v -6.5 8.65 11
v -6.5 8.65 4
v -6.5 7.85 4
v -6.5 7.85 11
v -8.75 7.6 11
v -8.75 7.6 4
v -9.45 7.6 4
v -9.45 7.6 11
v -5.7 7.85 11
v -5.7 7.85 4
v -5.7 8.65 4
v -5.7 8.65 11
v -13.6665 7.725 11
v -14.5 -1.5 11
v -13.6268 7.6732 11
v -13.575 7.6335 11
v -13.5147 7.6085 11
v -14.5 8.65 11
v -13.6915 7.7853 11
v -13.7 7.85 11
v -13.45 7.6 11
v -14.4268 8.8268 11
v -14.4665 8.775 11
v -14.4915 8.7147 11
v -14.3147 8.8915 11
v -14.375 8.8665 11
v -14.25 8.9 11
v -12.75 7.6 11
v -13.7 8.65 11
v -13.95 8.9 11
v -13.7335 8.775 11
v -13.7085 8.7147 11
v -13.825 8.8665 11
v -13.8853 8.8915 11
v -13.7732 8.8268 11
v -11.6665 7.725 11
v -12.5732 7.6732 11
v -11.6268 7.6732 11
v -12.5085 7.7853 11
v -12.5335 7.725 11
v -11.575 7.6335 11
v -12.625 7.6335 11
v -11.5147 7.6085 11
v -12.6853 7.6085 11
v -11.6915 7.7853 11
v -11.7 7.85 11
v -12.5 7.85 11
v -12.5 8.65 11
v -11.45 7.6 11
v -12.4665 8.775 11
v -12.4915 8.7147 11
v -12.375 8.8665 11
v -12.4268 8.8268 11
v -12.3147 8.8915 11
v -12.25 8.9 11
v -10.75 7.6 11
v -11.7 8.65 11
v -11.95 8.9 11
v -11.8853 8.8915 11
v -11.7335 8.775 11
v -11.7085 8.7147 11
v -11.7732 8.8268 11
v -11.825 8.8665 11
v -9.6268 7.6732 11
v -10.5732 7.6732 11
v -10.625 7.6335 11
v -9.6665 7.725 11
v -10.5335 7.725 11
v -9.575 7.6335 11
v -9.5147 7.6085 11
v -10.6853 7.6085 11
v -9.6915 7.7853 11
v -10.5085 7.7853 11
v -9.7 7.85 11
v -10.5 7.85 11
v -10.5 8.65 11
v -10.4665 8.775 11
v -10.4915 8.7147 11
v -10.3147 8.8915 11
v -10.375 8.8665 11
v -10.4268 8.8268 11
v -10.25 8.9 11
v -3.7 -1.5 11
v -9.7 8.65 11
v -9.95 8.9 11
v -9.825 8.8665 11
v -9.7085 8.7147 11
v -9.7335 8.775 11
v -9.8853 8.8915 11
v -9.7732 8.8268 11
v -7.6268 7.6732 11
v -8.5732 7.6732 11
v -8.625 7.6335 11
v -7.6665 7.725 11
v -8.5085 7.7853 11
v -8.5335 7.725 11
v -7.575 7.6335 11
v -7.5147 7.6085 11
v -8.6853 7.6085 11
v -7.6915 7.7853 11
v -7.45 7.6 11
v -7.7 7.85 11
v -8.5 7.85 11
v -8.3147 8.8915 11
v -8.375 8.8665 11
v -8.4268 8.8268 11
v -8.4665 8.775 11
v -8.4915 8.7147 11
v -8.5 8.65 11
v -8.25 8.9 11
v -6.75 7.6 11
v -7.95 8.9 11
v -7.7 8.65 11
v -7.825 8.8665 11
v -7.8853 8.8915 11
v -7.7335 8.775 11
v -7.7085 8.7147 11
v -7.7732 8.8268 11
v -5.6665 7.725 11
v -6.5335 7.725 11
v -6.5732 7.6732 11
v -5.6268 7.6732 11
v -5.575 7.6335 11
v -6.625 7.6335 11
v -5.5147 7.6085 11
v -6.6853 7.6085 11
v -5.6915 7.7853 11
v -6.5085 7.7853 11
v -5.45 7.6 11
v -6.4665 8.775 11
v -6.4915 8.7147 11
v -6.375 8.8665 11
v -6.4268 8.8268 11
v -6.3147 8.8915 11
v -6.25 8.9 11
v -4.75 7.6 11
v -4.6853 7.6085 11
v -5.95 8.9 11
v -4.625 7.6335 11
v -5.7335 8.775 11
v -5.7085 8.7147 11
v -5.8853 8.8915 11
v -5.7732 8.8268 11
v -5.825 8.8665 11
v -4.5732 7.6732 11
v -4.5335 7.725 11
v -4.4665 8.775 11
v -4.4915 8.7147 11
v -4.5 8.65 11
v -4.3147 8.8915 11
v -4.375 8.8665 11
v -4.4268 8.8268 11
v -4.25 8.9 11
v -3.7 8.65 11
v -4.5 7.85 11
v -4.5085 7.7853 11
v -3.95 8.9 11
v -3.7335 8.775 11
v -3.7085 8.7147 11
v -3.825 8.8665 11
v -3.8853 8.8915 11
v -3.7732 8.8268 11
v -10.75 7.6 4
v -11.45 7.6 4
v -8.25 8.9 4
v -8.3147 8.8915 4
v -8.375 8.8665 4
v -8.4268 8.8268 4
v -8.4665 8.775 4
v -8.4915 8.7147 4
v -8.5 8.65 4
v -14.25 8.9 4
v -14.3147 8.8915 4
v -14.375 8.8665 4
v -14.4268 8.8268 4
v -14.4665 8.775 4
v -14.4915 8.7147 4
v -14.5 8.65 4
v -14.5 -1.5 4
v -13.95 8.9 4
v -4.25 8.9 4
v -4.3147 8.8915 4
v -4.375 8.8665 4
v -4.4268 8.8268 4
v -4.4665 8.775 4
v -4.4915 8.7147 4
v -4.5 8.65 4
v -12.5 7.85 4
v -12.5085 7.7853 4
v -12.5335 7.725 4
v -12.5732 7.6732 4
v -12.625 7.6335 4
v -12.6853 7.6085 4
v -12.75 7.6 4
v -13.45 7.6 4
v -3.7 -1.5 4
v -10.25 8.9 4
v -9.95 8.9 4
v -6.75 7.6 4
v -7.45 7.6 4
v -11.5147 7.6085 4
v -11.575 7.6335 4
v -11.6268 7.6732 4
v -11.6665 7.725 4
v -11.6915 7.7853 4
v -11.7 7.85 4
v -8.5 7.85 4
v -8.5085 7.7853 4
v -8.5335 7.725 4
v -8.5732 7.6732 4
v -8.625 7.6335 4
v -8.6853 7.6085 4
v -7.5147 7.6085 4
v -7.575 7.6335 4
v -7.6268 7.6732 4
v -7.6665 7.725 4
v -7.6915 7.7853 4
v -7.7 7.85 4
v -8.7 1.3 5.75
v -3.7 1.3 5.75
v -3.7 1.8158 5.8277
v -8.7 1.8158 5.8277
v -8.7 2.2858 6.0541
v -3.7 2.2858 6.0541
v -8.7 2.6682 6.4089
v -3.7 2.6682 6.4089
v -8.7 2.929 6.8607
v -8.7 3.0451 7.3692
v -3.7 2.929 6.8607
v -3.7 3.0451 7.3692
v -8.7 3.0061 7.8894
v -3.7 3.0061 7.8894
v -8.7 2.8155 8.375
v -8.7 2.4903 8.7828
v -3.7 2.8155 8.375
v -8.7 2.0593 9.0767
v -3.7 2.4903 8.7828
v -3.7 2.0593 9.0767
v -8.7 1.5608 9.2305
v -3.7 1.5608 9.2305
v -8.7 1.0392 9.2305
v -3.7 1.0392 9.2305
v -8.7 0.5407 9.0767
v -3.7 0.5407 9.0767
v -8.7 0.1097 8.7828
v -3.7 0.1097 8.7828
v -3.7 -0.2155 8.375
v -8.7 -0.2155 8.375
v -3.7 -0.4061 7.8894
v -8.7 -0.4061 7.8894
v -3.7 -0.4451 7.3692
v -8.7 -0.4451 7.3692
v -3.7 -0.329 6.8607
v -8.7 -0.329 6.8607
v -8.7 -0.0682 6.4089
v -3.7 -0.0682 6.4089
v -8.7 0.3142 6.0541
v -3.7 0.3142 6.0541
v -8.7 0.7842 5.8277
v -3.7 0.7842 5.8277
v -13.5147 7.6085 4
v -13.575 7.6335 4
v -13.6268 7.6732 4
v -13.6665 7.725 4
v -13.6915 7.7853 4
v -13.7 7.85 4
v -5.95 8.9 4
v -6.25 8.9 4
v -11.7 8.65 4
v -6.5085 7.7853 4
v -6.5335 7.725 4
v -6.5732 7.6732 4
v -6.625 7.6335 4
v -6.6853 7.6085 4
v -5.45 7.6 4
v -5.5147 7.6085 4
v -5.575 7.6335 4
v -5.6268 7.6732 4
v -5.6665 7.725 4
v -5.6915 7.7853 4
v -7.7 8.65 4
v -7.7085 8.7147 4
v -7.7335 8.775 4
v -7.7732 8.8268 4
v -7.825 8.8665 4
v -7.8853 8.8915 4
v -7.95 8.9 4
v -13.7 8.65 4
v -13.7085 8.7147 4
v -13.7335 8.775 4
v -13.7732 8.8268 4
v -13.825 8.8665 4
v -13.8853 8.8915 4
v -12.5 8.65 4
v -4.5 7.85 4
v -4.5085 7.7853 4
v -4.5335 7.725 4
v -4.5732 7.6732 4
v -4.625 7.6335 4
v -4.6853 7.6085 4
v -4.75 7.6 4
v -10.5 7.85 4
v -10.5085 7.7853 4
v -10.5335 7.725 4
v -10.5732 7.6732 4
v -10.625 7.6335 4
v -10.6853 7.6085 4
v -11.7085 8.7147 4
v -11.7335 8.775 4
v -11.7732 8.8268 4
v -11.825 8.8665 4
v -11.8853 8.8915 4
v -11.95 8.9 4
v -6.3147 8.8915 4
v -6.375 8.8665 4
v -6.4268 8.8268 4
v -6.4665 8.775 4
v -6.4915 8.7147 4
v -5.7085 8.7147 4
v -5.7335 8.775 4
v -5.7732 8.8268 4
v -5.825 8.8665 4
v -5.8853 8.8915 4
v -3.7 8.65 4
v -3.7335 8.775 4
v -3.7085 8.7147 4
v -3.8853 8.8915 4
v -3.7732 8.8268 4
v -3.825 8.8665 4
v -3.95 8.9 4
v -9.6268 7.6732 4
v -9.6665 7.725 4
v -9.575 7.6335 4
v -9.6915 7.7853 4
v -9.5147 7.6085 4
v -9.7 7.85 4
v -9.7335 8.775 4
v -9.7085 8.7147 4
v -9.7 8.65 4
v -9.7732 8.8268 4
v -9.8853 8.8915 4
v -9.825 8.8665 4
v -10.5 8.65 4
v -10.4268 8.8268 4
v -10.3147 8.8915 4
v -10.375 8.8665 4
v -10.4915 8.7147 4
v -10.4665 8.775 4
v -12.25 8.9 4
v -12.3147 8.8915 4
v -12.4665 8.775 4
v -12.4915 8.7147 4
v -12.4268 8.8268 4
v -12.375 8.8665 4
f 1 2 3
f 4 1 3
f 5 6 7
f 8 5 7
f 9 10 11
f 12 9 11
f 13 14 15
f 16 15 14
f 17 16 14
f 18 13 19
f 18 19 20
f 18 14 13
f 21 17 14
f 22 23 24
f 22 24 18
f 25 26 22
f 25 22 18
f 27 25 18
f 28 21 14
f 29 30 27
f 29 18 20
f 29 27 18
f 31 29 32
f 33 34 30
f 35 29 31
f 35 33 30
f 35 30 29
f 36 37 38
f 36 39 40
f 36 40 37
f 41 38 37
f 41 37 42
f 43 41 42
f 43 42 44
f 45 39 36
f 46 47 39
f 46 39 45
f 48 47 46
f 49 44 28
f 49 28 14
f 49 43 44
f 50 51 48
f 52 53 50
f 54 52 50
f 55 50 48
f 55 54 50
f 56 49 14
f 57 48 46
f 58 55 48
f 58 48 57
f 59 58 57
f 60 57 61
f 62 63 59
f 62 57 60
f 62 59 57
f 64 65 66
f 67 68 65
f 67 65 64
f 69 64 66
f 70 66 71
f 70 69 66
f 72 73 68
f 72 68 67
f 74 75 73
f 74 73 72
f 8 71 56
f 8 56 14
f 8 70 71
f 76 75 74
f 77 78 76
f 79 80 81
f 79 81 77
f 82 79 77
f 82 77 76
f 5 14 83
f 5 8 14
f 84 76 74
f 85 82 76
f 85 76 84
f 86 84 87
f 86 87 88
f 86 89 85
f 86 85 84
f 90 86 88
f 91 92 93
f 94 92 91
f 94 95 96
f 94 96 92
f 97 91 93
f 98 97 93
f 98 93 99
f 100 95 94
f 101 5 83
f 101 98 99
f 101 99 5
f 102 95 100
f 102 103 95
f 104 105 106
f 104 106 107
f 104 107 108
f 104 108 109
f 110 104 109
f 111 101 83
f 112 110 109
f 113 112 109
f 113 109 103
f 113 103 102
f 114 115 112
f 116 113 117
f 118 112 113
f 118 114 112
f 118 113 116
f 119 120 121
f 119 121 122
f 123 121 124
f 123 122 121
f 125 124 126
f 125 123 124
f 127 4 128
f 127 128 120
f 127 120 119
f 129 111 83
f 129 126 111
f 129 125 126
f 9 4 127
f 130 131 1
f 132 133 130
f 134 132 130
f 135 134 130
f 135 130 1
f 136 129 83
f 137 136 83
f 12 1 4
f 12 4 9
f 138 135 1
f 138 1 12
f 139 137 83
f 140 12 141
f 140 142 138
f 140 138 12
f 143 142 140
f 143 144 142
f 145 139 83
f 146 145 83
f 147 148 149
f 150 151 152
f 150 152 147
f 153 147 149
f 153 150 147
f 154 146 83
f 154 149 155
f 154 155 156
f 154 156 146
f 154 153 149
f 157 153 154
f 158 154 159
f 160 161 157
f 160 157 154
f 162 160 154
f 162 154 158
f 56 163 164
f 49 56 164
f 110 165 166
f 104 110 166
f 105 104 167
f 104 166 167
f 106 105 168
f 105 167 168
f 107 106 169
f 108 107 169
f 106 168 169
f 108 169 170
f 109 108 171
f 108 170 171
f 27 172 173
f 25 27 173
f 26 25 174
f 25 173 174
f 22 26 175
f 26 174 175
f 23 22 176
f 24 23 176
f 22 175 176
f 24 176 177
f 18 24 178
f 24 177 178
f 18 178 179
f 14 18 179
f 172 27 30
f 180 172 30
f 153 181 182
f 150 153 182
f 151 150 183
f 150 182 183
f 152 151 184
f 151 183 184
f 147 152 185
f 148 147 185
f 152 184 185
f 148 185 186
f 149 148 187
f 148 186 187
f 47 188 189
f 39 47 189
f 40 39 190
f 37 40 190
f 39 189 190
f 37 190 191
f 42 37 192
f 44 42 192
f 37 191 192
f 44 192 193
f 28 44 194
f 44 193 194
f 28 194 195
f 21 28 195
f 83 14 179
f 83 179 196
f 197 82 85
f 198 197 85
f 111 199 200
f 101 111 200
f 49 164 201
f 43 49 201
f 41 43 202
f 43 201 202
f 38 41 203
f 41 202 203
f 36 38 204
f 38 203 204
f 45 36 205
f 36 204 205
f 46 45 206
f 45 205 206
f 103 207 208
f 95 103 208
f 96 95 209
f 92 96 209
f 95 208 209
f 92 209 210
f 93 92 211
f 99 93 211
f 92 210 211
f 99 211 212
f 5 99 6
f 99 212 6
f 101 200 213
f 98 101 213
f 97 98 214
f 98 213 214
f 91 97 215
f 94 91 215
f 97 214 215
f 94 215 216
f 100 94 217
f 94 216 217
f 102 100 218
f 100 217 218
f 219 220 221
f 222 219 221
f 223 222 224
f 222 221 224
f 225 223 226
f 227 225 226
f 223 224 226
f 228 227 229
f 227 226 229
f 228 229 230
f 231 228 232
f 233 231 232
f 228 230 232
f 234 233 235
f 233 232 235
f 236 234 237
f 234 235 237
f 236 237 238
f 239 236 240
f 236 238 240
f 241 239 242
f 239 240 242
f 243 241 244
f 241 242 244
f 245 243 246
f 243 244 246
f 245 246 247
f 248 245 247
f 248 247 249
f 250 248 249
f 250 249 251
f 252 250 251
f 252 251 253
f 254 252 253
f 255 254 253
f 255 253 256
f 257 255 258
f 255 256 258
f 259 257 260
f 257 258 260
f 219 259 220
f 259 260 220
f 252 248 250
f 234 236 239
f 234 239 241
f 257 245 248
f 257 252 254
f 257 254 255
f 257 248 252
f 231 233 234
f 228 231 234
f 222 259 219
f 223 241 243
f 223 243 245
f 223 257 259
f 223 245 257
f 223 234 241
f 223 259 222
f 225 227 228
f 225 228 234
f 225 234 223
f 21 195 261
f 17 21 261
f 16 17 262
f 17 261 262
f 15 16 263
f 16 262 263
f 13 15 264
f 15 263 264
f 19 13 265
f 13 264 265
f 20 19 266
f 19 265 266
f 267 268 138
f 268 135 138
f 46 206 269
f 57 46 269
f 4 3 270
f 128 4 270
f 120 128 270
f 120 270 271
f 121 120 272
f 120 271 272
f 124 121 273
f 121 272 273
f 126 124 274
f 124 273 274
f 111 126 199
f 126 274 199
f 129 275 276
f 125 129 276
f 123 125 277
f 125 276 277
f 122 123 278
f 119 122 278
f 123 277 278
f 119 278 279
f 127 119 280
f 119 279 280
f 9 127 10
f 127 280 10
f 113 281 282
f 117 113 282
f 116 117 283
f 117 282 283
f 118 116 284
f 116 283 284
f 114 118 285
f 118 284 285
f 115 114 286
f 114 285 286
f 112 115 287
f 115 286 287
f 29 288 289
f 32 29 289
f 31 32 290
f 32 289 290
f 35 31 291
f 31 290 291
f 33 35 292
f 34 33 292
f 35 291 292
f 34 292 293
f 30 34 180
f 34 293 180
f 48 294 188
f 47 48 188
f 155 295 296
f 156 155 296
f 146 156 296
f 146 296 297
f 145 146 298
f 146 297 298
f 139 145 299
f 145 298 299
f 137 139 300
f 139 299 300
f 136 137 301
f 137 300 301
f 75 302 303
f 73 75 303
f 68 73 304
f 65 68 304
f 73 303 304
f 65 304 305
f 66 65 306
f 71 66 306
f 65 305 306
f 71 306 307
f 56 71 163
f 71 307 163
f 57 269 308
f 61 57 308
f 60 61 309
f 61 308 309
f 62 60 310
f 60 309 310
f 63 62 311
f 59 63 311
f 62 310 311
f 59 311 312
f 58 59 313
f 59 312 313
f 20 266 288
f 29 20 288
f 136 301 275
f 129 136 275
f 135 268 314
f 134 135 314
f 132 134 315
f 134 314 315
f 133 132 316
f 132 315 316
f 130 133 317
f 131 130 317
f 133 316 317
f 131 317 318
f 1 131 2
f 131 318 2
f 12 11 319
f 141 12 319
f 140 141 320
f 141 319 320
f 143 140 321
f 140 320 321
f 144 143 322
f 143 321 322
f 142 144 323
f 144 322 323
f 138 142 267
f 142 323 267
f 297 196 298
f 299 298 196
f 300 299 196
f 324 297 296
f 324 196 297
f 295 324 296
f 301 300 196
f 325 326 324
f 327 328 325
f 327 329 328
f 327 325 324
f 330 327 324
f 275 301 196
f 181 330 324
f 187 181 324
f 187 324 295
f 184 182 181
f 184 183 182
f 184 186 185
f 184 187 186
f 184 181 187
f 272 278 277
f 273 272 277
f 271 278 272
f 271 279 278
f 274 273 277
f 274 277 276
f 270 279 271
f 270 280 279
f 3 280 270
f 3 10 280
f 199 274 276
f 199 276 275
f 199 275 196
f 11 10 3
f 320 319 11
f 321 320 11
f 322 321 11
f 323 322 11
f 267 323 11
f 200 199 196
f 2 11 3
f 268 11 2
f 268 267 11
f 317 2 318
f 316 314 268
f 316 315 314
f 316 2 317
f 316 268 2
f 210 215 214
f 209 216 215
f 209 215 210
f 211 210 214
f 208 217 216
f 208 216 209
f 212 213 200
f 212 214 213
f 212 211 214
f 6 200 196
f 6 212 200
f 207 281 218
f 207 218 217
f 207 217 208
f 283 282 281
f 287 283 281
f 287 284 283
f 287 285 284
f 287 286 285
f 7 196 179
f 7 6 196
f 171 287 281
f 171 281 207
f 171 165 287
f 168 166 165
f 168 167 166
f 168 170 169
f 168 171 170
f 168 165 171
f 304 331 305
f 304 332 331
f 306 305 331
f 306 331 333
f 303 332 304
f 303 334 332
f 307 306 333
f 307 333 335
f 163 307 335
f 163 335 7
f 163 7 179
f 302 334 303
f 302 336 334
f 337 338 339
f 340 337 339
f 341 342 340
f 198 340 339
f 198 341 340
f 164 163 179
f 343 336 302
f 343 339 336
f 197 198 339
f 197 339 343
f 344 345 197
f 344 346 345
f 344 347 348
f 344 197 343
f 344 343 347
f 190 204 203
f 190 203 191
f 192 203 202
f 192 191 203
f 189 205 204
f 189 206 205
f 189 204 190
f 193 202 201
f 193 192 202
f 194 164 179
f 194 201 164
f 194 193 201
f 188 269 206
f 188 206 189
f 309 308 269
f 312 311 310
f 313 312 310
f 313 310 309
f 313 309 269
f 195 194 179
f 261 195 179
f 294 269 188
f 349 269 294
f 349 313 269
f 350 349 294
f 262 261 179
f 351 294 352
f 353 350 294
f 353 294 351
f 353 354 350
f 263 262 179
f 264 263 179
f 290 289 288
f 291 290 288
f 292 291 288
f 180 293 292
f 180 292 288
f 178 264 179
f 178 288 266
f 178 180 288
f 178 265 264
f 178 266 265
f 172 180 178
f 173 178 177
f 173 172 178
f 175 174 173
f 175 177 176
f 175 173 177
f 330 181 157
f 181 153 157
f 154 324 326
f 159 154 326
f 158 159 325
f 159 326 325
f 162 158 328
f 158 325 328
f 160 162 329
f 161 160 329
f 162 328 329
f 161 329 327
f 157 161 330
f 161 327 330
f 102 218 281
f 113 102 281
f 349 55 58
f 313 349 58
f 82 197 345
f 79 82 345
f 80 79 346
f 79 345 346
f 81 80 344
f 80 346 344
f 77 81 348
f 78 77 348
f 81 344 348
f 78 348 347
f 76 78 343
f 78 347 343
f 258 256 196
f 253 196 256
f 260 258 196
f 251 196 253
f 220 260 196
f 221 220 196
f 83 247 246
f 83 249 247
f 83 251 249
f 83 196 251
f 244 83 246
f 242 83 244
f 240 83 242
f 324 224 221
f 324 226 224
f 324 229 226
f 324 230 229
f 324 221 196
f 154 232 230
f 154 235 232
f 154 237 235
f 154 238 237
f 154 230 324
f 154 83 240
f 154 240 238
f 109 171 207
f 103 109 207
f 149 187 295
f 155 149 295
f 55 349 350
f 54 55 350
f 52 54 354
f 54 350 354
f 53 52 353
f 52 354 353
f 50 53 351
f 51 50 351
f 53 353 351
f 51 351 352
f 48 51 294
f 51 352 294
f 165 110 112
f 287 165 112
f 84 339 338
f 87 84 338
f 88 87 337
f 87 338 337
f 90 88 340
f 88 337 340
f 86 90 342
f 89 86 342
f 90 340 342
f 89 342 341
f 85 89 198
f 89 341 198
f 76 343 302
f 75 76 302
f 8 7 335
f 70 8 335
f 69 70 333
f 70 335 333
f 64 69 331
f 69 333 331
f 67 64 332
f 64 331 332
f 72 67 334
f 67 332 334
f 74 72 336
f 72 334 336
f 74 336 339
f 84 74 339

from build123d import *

# Parameters (mm, degrees)
SKETCH_1_W              = 4.5
SKETCH_1_H              = 2.5
SKETCH_1_H_2            = 2
EXTRUDE_1_DEPTH         = 4
EXTRUDE_3_DEPTH         = 26
EXTRUDE_3_DEPTH_BACK    = 26
EXTRUDE_START           = -14
EXTRUDE_4_DEPTH         = 28
EXTRUDE_START_2         = 24.3
EXTRUDE_5_DEPTH         = 1.7
EXTRUDE_START_3         = 12.3
EXTRUDE_6_DEPTH         = 1.7
SKETCH_3_R              = 2
EXTRUDE_7_DEPTH         = 7
FILLET_1_R              = 3
CUT_EXTRUDE_1_REACH     = 42.685
SKETCH_3_4_R            = 2
CUT_EXTRUDE_START       = -24.3
SKETCH_4_R              = 7.5
CUT_EXTRUDE_2_DEPTH     = 24.3
CUT_EXTRUDE_START_2     = -12.3
SKETCH_4_3_R            = 7.5
CUT_EXTRUDE_3_DEPTH     = 12.3
FILLET_2_R              = 3
SKETCH_5_W              = 4.5
SKETCH_5_H              = 1
CUT_EXTRUDE_5_DEPTH     = 52.439284598
CUT_EXTRUDE_START_3     = 18
CUT_EXTRUDE_6_OUTLINE_W = 4.5
CUT_EXTRUDE_6_OUTLINE_H = 1.8
CUT_EXTRUDE_6_DEPTH     = 18
FILLET_3_R              = 2
SKETCH_6_W              = 3
SKETCH_6_H              = 6
CUT_EXTRUDE_7_DEPTH     = 7
SKETCH_7_R              = 1.8
CUT_EXTRUDE_8_DEPTH     = 56.463952257
SKETCH_10_OUTSIDE_W     = 70.182
SKETCH_10_OUTSIDE_H     = 79.182
SKETCH_10_OUTSIDE_W_2   = 10.8
SKETCH_10_OUTSIDE_H_2   = 10.4
CUT_EXTRUDE_11_DEPTH    = 42.560197394
SKETCH_11_W             = 4
SKETCH_11_H             = 10.4
CUT_EXTRUDE_12_DEPTH    = 18.800280897
SKETCH_13_R             = 2
EXTRUDE_8_DEPTH         = 7
SKETCH_14_R             = 1.75
CUT_EXTRUDE_13_DEPTH    = 5


# Read off the part's stored shape, not the designer's step: 凸台-拉伸4, 切除-拉伸6
with BuildPart() as part:
    # 草图1 → 凸台-拉伸1 (new body)
    with BuildSketch(Plane.XY):
        Polygon((26, 30.5), (-26, 30.5), (-26, 12.5), (-26, -3), (-14, -3), (-14, -5.5), (-14, -30.5), (14, -30.5), (14, -5.5), (14, -3), (26, -3), (26, 12.5), align=None)
        with Locations((0, -24.75)):
            Rectangle(SKETCH_1_W, SKETCH_1_H, mode=Mode.SUBTRACT)
        with Locations((0, -4.25)):
            Rectangle(SKETCH_1_W, SKETCH_1_H, mode=Mode.SUBTRACT)
        with Locations((-12.25, 11.5)):
            Rectangle(SKETCH_1_W, SKETCH_1_H_2, mode=Mode.SUBTRACT)
        with Locations((12.25, 11.5)):
            Rectangle(SKETCH_1_W, SKETCH_1_H_2, mode=Mode.SUBTRACT)
    extrude(amount=EXTRUDE_1_DEPTH)

    # 草图2 → 凸台-拉伸3 (add, two sides: drawn at the far end of the back side and taken through both)
    with BuildSketch(Plane(origin=(0, 0, 0), x_dir=(0, 0, -1), z_dir=(1, 0, 0)).offset(-EXTRUDE_3_DEPTH_BACK)):
        with BuildLine():
            Line((0, 30.5), (-10, 30.5))
            ThreePointArc((-10, 30.5), (-1, 21.5), (-10, 12.5))
            Line((-10, 12.5), (0, 12.5))
            Line((0, 12.5), (0, 30.5))
        make_face()
        with BuildLine():
            Line((-10, 14), (-10, 12.5))
            ThreePointArc((-10, 12.5), (-1, 21.5), (-10, 30.5))
            Line((-10, 30.5), (-10, 29))
            ThreePointArc((-10, 29), (-2.5, 21.5), (-10, 14))
        make_face()
    extrude(amount=EXTRUDE_3_DEPTH + EXTRUDE_3_DEPTH_BACK)

    # 凸台-拉伸4 outline → 凸台-拉伸4 (add)
    with BuildSketch(Plane(origin=(0, 0, 0), x_dir=(0, 0, -1), z_dir=(1, 0, 0)).offset(EXTRUDE_START)):
        with BuildLine():
            ThreePointArc((-10, -7), (-6.645898034, -7.791796068), (-4, -10))
            Line((-4, -10), (-4, -5.5))
            Line((-4, -5.5), (-10, -5.5))
            Line((-10, -5.5), (-10, -7))
        make_face()
        with BuildLine():
            Line((-10, -23.5), (-4, -23.5))
            Line((-4, -23.5), (-4, -19))
            ThreePointArc((-4, -19), (-6.645898034, -21.208203932), (-10, -22))
            Line((-10, -22), (-10, -23.5))
        make_face()
    extrude(amount=EXTRUDE_4_DEPTH)

    # 草图2<5> → 凸台-拉伸5 (add)
    with BuildSketch(Plane(origin=(0, 0, 0), x_dir=(0, 0, -1), z_dir=(1, 0, 0)).offset(EXTRUDE_START_2)):
        with BuildLine():
            Line((-10, 16.5), (-10, 14))
            ThreePointArc((-10, 14), (-2.5, 21.5), (-10, 29))
            Line((-10, 29), (-10, 26.5))
            ThreePointArc((-10, 26.5), (-5, 21.5), (-10, 16.5))
        make_face()
    extrude_5 = extrude(amount=EXTRUDE_5_DEPTH)

    # 草图2<6> → 凸台-拉伸6 (add)
    with BuildSketch(Plane(origin=(0, 0, 0), x_dir=(0, 0, -1), z_dir=(1, 0, 0)).offset(EXTRUDE_START_3)):
        with BuildLine():
            Line((-10, -9.5), (-10, -7))
            ThreePointArc((-10, -7), (-2.5, -14.5), (-10, -22))
            Line((-10, -22), (-10, -19.5))
            ThreePointArc((-10, -19.5), (-5, -14.5), (-10, -9.5))
        make_face()
    extrude_6 = extrude(amount=EXTRUDE_6_DEPTH)

    # 镜向1: 凸台-拉伸5, 凸台-拉伸6 across plane
    add(extrude_5.mirror(Plane(origin=(0, 0, 0), x_dir=(0, 0, 1), z_dir=(1, 0, 0))))
    add(extrude_6.mirror(Plane(origin=(0, 0, 0), x_dir=(0, 0, 1), z_dir=(1, 0, 0))))

    # 草图3 → 凸台-拉伸7 (add)
    # profile 1 of 2: a face of its own
    with BuildSketch(Plane.XY.offset(4)):
        with BuildLine():
            Line((-14.5, 8.65), (-14.5, -3))
            Line((-14.5, -3), (26, -3))
            Line((26, -3), (26, 8.65))
            Line((26, 8.65), (15.5, 8.65))
            Line((15.5, 8.65), (15.5, 7.85))
            ThreePointArc((15.5, 7.85), (15.426776695, 7.673223305), (15.25, 7.6))
            Line((15.25, 7.6), (14.55, 7.6))
            ThreePointArc((14.55, 7.6), (14.373223305, 7.673223305), (14.3, 7.85))
            Line((14.3, 7.85), (14.3, 8.65))
            ThreePointArc((14.3, 8.65), (14.226776695, 8.826776695), (14.05, 8.9))
            Line((14.05, 8.9), (13.75, 8.9))
            ThreePointArc((13.75, 8.9), (13.573223305, 8.826776695), (13.5, 8.65))
            Line((13.5, 8.65), (13.5, 7.85))
            ThreePointArc((13.5, 7.85), (13.426776695, 7.673223305), (13.25, 7.6))
            Line((13.25, 7.6), (12.55, 7.6))
            ThreePointArc((12.55, 7.6), (12.373223305, 7.673223305), (12.3, 7.85))
            Line((12.3, 7.85), (12.3, 8.65))
            ThreePointArc((12.3, 8.65), (12.226776695, 8.826776695), (12.05, 8.9))
            Line((12.05, 8.9), (11.75, 8.9))
            ThreePointArc((11.75, 8.9), (11.573223305, 8.826776695), (11.5, 8.65))
            Line((11.5, 8.65), (11.5, 7.85))
            ThreePointArc((11.5, 7.85), (11.426776695, 7.673223305), (11.25, 7.6))
            Line((11.25, 7.6), (10.55, 7.6))
            ThreePointArc((10.55, 7.6), (10.373223305, 7.673223305), (10.3, 7.85))
            Line((10.3, 7.85), (10.3, 8.65))
            ThreePointArc((10.3, 8.65), (10.226776695, 8.826776695), (10.05, 8.9))
            Line((10.05, 8.9), (9.75, 8.9))
            ThreePointArc((9.75, 8.9), (9.573223305, 8.826776695), (9.5, 8.65))
            Line((9.5, 8.65), (9.5, 7.85))
            ThreePointArc((9.5, 7.85), (9.426776695, 7.673223305), (9.25, 7.6))
            Line((9.25, 7.6), (8.55, 7.6))
            ThreePointArc((8.55, 7.6), (8.373223305, 7.673223305), (8.3, 7.85))
            Line((8.3, 7.85), (8.3, 8.65))
            ThreePointArc((8.3, 8.65), (8.226776695, 8.826776695), (8.05, 8.9))
            Line((8.05, 8.9), (7.75, 8.9))
            ThreePointArc((7.75, 8.9), (7.573223305, 8.826776695), (7.5, 8.65))
            Line((7.5, 8.65), (7.5, 7.85))
            ThreePointArc((7.5, 7.85), (7.426776695, 7.673223305), (7.25, 7.6))
            Line((7.25, 7.6), (6.55, 7.6))
            ThreePointArc((6.55, 7.6), (6.373223305, 7.673223305), (6.3, 7.85))
            Line((6.3, 7.85), (6.3, 8.65))
            ThreePointArc((6.3, 8.65), (6.226776695, 8.826776695), (6.05, 8.9))
            Line((6.05, 8.9), (5.75, 8.9))
            ThreePointArc((5.75, 8.9), (5.573223305, 8.826776695), (5.5, 8.65))
            Line((5.5, 8.65), (5.5, 7.85))
            ThreePointArc((5.5, 7.85), (5.426776695, 7.673223305), (5.25, 7.6))
            Line((5.25, 7.6), (4.55, 7.6))
            ThreePointArc((4.55, 7.6), (4.373223305, 7.673223305), (4.3, 7.85))
            Line((4.3, 7.85), (4.3, 8.65))
            ThreePointArc((4.3, 8.65), (4.226776695, 8.826776695), (4.05, 8.9))
            Line((4.05, 8.9), (3.75, 8.9))
            ThreePointArc((3.75, 8.9), (3.573223305, 8.826776695), (3.5, 8.65))
            Line((3.5, 8.65), (3.5, 7.85))
            ThreePointArc((3.5, 7.85), (3.426776695, 7.673223305), (3.25, 7.6))
            Line((3.25, 7.6), (2.55, 7.6))
            ThreePointArc((2.55, 7.6), (2.373223305, 7.673223305), (2.3, 7.85))
            Line((2.3, 7.85), (2.3, 8.65))
            ThreePointArc((2.3, 8.65), (2.226776695, 8.826776695), (2.05, 8.9))
            Line((2.05, 8.9), (1.75, 8.9))
            ThreePointArc((1.75, 8.9), (1.573223305, 8.826776695), (1.5, 8.65))
            Line((1.5, 8.65), (1.5, 7.85))
            ThreePointArc((1.5, 7.85), (1.426776695, 7.673223305), (1.25, 7.6))
            Line((1.25, 7.6), (0.55, 7.6))
            ThreePointArc((0.55, 7.6), (0.373223305, 7.673223305), (0.3, 7.85))
            Line((0.3, 7.85), (0.3, 8.65))
            ThreePointArc((0.3, 8.65), (0.226776695, 8.826776695), (0.05, 8.9))
            Line((0.05, 8.9), (-0.25, 8.9))
            ThreePointArc((-0.25, 8.9), (-0.426776695, 8.826776695), (-0.5, 8.65))
            Line((-0.5, 8.65), (-0.5, 7.85))
            ThreePointArc((-0.5, 7.85), (-0.573223305, 7.673223305), (-0.75, 7.6))
            Line((-0.75, 7.6), (-1.45, 7.6))
            ThreePointArc((-1.45, 7.6), (-1.626776695, 7.673223305), (-1.7, 7.85))
            Line((-1.7, 7.85), (-1.7, 8.65))
            ThreePointArc((-1.7, 8.65), (-1.773223305, 8.826776695), (-1.95, 8.9))
            Line((-1.95, 8.9), (-2.25, 8.9))
            ThreePointArc((-2.25, 8.9), (-2.426776695, 8.826776695), (-2.5, 8.65))
            Line((-2.5, 8.65), (-2.5, 7.85))
            ThreePointArc((-2.5, 7.85), (-2.573223305, 7.673223305), (-2.75, 7.6))
            Line((-2.75, 7.6), (-3.45, 7.6))
            ThreePointArc((-3.45, 7.6), (-3.626776695, 7.673223305), (-3.7, 7.85))
            Line((-3.7, 7.85), (-3.7, 8.65))
            ThreePointArc((-3.7, 8.65), (-3.773223305, 8.826776695), (-3.95, 8.9))
            Line((-3.95, 8.9), (-4.25, 8.9))
            ThreePointArc((-4.25, 8.9), (-4.426776695, 8.826776695), (-4.5, 8.65))
            Line((-4.5, 8.65), (-4.5, 7.85))
            ThreePointArc((-4.5, 7.85), (-4.573223305, 7.673223305), (-4.75, 7.6))
            Line((-4.75, 7.6), (-5.45, 7.6))
            ThreePointArc((-5.45, 7.6), (-5.626776695, 7.673223305), (-5.7, 7.85))
            Line((-5.7, 7.85), (-5.7, 8.65))
            ThreePointArc((-5.7, 8.65), (-5.773223305, 8.826776695), (-5.95, 8.9))
            Line((-5.95, 8.9), (-6.25, 8.9))
            ThreePointArc((-6.25, 8.9), (-6.426776695, 8.826776695), (-6.5, 8.65))
            Line((-6.5, 8.65), (-6.5, 7.85))
            ThreePointArc((-6.5, 7.85), (-6.573223305, 7.673223305), (-6.75, 7.6))
            Line((-6.75, 7.6), (-7.45, 7.6))
            ThreePointArc((-7.45, 7.6), (-7.626776695, 7.673223305), (-7.7, 7.85))
            Line((-7.7, 7.85), (-7.7, 8.65))
            ThreePointArc((-7.7, 8.65), (-7.773223305, 8.826776695), (-7.95, 8.9))
            Line((-7.95, 8.9), (-8.25, 8.9))
            ThreePointArc((-8.25, 8.9), (-8.426776695, 8.826776695), (-8.5, 8.65))
            Line((-8.5, 8.65), (-8.5, 7.85))
            ThreePointArc((-8.5, 7.85), (-8.573223305, 7.673223305), (-8.75, 7.6))
            Line((-8.75, 7.6), (-9.45, 7.6))
            ThreePointArc((-9.45, 7.6), (-9.626776695, 7.673223305), (-9.7, 7.85))
            Line((-9.7, 7.85), (-9.7, 8.65))
            ThreePointArc((-9.7, 8.65), (-9.773223305, 8.826776695), (-9.95, 8.9))
            Line((-9.95, 8.9), (-10.25, 8.9))
            ThreePointArc((-10.25, 8.9), (-10.426776695, 8.826776695), (-10.5, 8.65))
            Line((-10.5, 8.65), (-10.5, 7.85))
            ThreePointArc((-10.5, 7.85), (-10.573223305, 7.673223305), (-10.75, 7.6))
            Line((-10.75, 7.6), (-11.45, 7.6))
            ThreePointArc((-11.45, 7.6), (-11.626776695, 7.673223305), (-11.7, 7.85))
            Line((-11.7, 7.85), (-11.7, 8.65))
            ThreePointArc((-11.7, 8.65), (-11.773223305, 8.826776695), (-11.95, 8.9))
            Line((-11.95, 8.9), (-12.25, 8.9))
            ThreePointArc((-12.25, 8.9), (-12.426776695, 8.826776695), (-12.5, 8.65))
            Line((-12.5, 8.65), (-12.5, 7.85))
            ThreePointArc((-12.5, 7.85), (-12.573223305, 7.673223305), (-12.75, 7.6))
            Line((-12.75, 7.6), (-13.45, 7.6))
            ThreePointArc((-13.45, 7.6), (-13.626776695, 7.673223305), (-13.7, 7.85))
            Line((-13.7, 7.85), (-13.7, 8.65))
            ThreePointArc((-13.7, 8.65), (-13.773223305, 8.826776695), (-13.95, 8.9))
            Line((-13.95, 8.9), (-14.25, 8.9))
            ThreePointArc((-14.25, 8.9), (-14.426776695, 8.826776695), (-14.5, 8.65))
        make_face()
        with Locations((-9.1, 3)):
            Circle(SKETCH_3_R, mode=Mode.SUBTRACT)
    # profile 2 of 2: a face of its own
    with BuildSketch(Plane.XY.offset(4)):
        Polygon((-14.5, 10.5), (-14.5, 9.8), (26, 9.8), (26, 12.5), (14.5, 12.5), (14.5, 10.5), (10, 10.5), (10, 12.5), (-10, 12.5), (-10, 10.5), align=None)
    extrude(amount=EXTRUDE_7_DEPTH)

    # 圆角1
    # the kernel refuses this fillet: 3 mm, written as the material it adds along each edge
    with BuildSketch(Plane(origin=(14, -3, 0), x_dir=(1.4808894851111503e-12, -1.0, 0), z_dir=(0, 0, 1))) as fillet_1_piece_1_section:
        with BuildLine():
            CenterArc((FILLET_1_R, FILLET_1_R), FILLET_1_R, 180, 90)
            Line((0, FILLET_1_R), (0, 0))
            Line((0, 0), (FILLET_1_R, 0))
        make_face()
    fillet_1_piece_1 = extrude(amount=4, mode=Mode.PRIVATE)
    fillet_1_piece_1 = split(fillet_1_piece_1, bisect_by=Plane(origin=(13.978029732, -5.5, 2), z_dir=(0, -1, 0)), keep=Keep.TOP, mode=Mode.PRIVATE)
    add(fillet_1_piece_1)
    with BuildSketch(Plane(origin=(14, -3, 0), x_dir=(1.4808894851111503e-12, -1.0, 0), z_dir=(0, 0, 1))) as fillet_1_piece_2_section:
        with BuildLine():
            CenterArc((FILLET_1_R, FILLET_1_R), FILLET_1_R, 180, 90)
            Line((0, FILLET_1_R), (0, 0))
            Line((0, 0), (FILLET_1_R, 0))
        make_face()
    fillet_1_piece_2 = extrude(amount=4, mode=Mode.PRIVATE)
    fillet_1_piece_2 = split(fillet_1_piece_2, bisect_by=Plane(origin=(14.690666213, -5.5, 2), z_dir=(0, 1, 0)), keep=Keep.TOP, mode=Mode.PRIVATE)
    add(fillet_1_piece_2)
    with BuildSketch(Plane(origin=(14, -3, 0), x_dir=(1.4808894851111503e-12, -1.0, 0), z_dir=(0, 0, 1))) as fillet_1_piece_3_section:
        with BuildLine():
            CenterArc((FILLET_1_R, FILLET_1_R), FILLET_1_R, 180, 90)
            Line((0, FILLET_1_R), (0, 0))
            Line((0, 0), (FILLET_1_R, 0))
        make_face()
    fillet_1_piece_3 = extrude(amount=11.5, mode=Mode.PRIVATE)
    fillet_1_piece_3 = split(fillet_1_piece_3, bisect_by=Plane(origin=(13.978029732, -5.726390424, 10), z_dir=(0, 0, -1)), keep=Keep.TOP, mode=Mode.PRIVATE)
    fillet_1_piece_3 = split(fillet_1_piece_3, bisect_by=Plane(origin=(13.978029732, -5.5, 7), z_dir=(0, -1, 0)), keep=Keep.TOP, mode=Mode.PRIVATE)
    fillet_1_piece_3 = split(fillet_1_piece_3, bisect_by=Plane(origin=(13.978029732, -5.726390424, 4), z_dir=(0, 0, 1)), keep=Keep.TOP, mode=Mode.PRIVATE)
    add(fillet_1_piece_3)
    with BuildSketch(Plane(origin=(-14, -3, 0), x_dir=(1.4305593746657148e-12, -1.0, 0), z_dir=(0, 0, 1))) as fillet_1_piece_4_section:
        with BuildLine():
            CenterArc((FILLET_1_R, -FILLET_1_R), FILLET_1_R, 90, 90)
            Line((0, -FILLET_1_R), (0, 0))
            Line((0, 0), (FILLET_1_R, 0))
        make_face()
    fillet_1_piece_4 = extrude(amount=4, mode=Mode.PRIVATE)
    fillet_1_piece_4 = split(fillet_1_piece_4, bisect_by=Plane(origin=(-13.978029732, -5.5, 2), z_dir=(0, -1, 0)), keep=Keep.TOP, mode=Mode.PRIVATE)
    add(fillet_1_piece_4)
    with BuildSketch(Plane(origin=(-14, -3, 0), x_dir=(1.4305593746657148e-12, -1.0, 0), z_dir=(0, 0, 1))) as fillet_1_piece_5_section:
        with BuildLine():
            CenterArc((FILLET_1_R, -FILLET_1_R), FILLET_1_R, 90, 90)
            Line((0, -FILLET_1_R), (0, 0))
            Line((0, 0), (FILLET_1_R, 0))
        make_face()
    fillet_1_piece_5 = extrude(amount=4, mode=Mode.PRIVATE)
    fillet_1_piece_5 = split(fillet_1_piece_5, bisect_by=Plane(origin=(-14.188378362, -5.5, 2), z_dir=(0, 1, 0)), keep=Keep.TOP, mode=Mode.PRIVATE)
    fillet_1_piece_5 = split(fillet_1_piece_5, bisect_by=Plane(origin=(-14.5, -3.973372494, 2), z_dir=(1, 0, 0)), keep=Keep.TOP, mode=Mode.PRIVATE)
    add(fillet_1_piece_5)
    with BuildSketch(Plane(origin=(-14, -3, 0), x_dir=(1.4305593746657148e-12, -1.0, 0), z_dir=(0, 0, 1))) as fillet_1_piece_6_section:
        with BuildLine():
            CenterArc((FILLET_1_R, -FILLET_1_R), FILLET_1_R, 90, 90)
            Line((0, -FILLET_1_R), (0, 0))
            Line((0, 0), (FILLET_1_R, 0))
        make_face()
    fillet_1_piece_6 = extrude(amount=11.5, mode=Mode.PRIVATE)
    fillet_1_piece_6 = split(fillet_1_piece_6, bisect_by=Plane(origin=(-13.978029732, -5.726390424, 10), z_dir=(0, 0, -1)), keep=Keep.TOP, mode=Mode.PRIVATE)
    fillet_1_piece_6 = split(fillet_1_piece_6, bisect_by=Plane(origin=(-13.978029732, -5.726390424, 4), z_dir=(0, 0, 1)), keep=Keep.TOP, mode=Mode.PRIVATE)
    fillet_1_piece_6 = split(fillet_1_piece_6, bisect_by=Plane(origin=(-13.978029732, -5.5, 7), z_dir=(0, -1, 0)), keep=Keep.TOP, mode=Mode.PRIVATE)
    add(fillet_1_piece_6)
    with BuildSketch(Plane(origin=(-14, -3, 0), x_dir=(1.4305593746657148e-12, -1.0, 0), z_dir=(0, 0, 1))) as fillet_1_piece_7_section:
        with BuildLine():
            CenterArc((FILLET_1_R, -FILLET_1_R), FILLET_1_R, 90, 90)
            Line((0, -FILLET_1_R), (0, 0))
            Line((0, 0), (FILLET_1_R, 0))
        make_face()
    fillet_1_piece_7 = extrude(amount=4, mode=Mode.PRIVATE)
    fillet_1_piece_7 = split(fillet_1_piece_7, bisect_by=Plane(origin=(-14.5, -3.326599677, 2), z_dir=(-1, 0, 0)), keep=Keep.TOP, mode=Mode.PRIVATE)
    add(fillet_1_piece_7)
    # the kernel refuses this fillet: 3 mm, written as the material it takes off along each edge
    with BuildSketch(Plane(origin=(14, -30.5, -7.5), x_dir=(0, 1, 0), z_dir=(0, 0, 1)), Plane(origin=(-14, -30.5, -7.5), x_dir=(1, 0, 0), z_dir=(0, 0, 1)), Plane(origin=(-26, -3, -7.5), x_dir=(1, 0, 0), z_dir=(0, 0, 1))) as fillet_1_2_piece_1:
        with BuildLine():
            CenterArc((FILLET_1_R, FILLET_1_R), FILLET_1_R, 180, 90)
            Line((0, FILLET_1_R), (0, 0))
            Line((0, 0), (FILLET_1_R, 0))
        make_face()
    extrude(amount=19, mode=Mode.SUBTRACT)
    with BuildSketch(Plane(origin=(26, -3, 18.5), x_dir=(-1, 0, 0), z_dir=(0, 0, -1))) as fillet_1_2_piece_2:
        with BuildLine():
            CenterArc((FILLET_1_R, FILLET_1_R), FILLET_1_R, 180, 90)
            Line((0, FILLET_1_R), (0, 0))
            Line((0, 0), (FILLET_1_R, 0))
        make_face()
    extrude(amount=26, mode=Mode.SUBTRACT)

    # 草图3<4> → 切除-拉伸1 (cut, up to next)
    with BuildSketch(Plane.XY.offset(4), mode=Mode.PRIVATE) as cut_extrude_1_sk1:
        with Locations((-8, -27)):
            Circle(SKETCH_3_4_R)
    cut_extrude_1_tool1 = extrude(cut_extrude_1_sk1.sketch, amount=-CUT_EXTRUDE_1_REACH, mode=Mode.PRIVATE) & part.part
    # 草图3<4> → 切除-拉伸1 (cut, up to next)
    with BuildSketch(Plane.XY.offset(4), mode=Mode.PRIVATE) as cut_extrude_1_sk2:
        with Locations((8, -27)):
            Circle(SKETCH_3_4_R)
    cut_extrude_1_tool2 = extrude(cut_extrude_1_sk2.sketch, amount=-CUT_EXTRUDE_1_REACH, mode=Mode.PRIVATE) & part.part
    # 草图3<4> → 切除-拉伸1 (cut, up to next)
    with BuildSketch(Plane.XY.offset(4), mode=Mode.PRIVATE) as cut_extrude_1_sk3:
        with Locations((-9.1, 3)):
            Circle(SKETCH_3_4_R)
    cut_extrude_1_tool3 = extrude(cut_extrude_1_sk3.sketch, amount=-CUT_EXTRUDE_1_REACH, mode=Mode.PRIVATE) & part.part
    add(cut_extrude_1_tool1.solids().sort_by_distance((-8, -27, 4))[0], mode=Mode.SUBTRACT)
    add(cut_extrude_1_tool2.solids().sort_by_distance((8, -27, 4))[0], mode=Mode.SUBTRACT)
    add(cut_extrude_1_tool3.solids().sort_by_distance((-9.1, 3, 4))[0], mode=Mode.SUBTRACT)

    # 草图4 → 切除-拉伸2 (cut)
    with BuildSketch(Plane(origin=(0, 0, 0), x_dir=(0, 0, -1), z_dir=(1, 0, 0)).offset(CUT_EXTRUDE_START)):
        with Locations((-10, 21.5)):
            Circle(SKETCH_4_R)
    cut_extrude_2 = extrude(amount=CUT_EXTRUDE_2_DEPTH, mode=Mode.SUBTRACT)

    # 草图4<3> → 切除-拉伸3 (cut)
    with BuildSketch(Plane(origin=(0, 0, 0), x_dir=(0, 0, -1), z_dir=(1, 0, 0)).offset(CUT_EXTRUDE_START_2)):
        with Locations((-10, -14.5)):
            Circle(SKETCH_4_3_R)
    cut_extrude_3 = extrude(amount=CUT_EXTRUDE_3_DEPTH, mode=Mode.SUBTRACT)

    # 镜向2: 切除-拉伸2, 切除-拉伸3 across plane
    add(cut_extrude_2.mirror(Plane(origin=(0, 0, 0), x_dir=(0, 0, 1), z_dir=(1, 0, 0))), mode=Mode.SUBTRACT)
    add(cut_extrude_3.mirror(Plane(origin=(0, 0, 0), x_dir=(0, 0, 1), z_dir=(1, 0, 0))), mode=Mode.SUBTRACT)

    # 圆角2
    fillet_2_edges = [part.edges().sort_by_distance(p)[0] for p in [
        (0, 30.5, 0),
    ]]
    fillet(fillet_2_edges, radius=FILLET_2_R)

    # 草图5 → 切除-拉伸5 (cut, through all)
    with BuildSketch(Plane.XZ.offset(-12.5)):
        with Locations((-12.25, 0.5)):
            Rectangle(SKETCH_5_W, SKETCH_5_H)
        with Locations((12.25, 0.5)):
            Rectangle(SKETCH_5_W, SKETCH_5_H)
    extrude(amount=-CUT_EXTRUDE_5_DEPTH, mode=Mode.SUBTRACT)

    # 切除-拉伸6 outline → 切除-拉伸6 (cut)
    with BuildSketch(Plane.XZ.offset(-12.5).offset(CUT_EXTRUDE_START_3)):
        with Locations((0, 0.9)):
            Rectangle(CUT_EXTRUDE_6_OUTLINE_W, CUT_EXTRUDE_6_OUTLINE_H)
    extrude(amount=CUT_EXTRUDE_6_DEPTH, mode=Mode.SUBTRACT)

    # 圆角3
    fillet_3_edges = [part.edges().sort_by_distance(p)[0] for p in [
        (-12.25, 12.5, 1),
        (12.25, 12.5, 1),
        (0, -23.5, 1.8),
        (0, -5.5, 1.8),
    ]]
    fillet(fillet_3_edges, radius=FILLET_3_R)

    # 草图6 → 切除-拉伸7 (cut)
    with BuildSketch(Plane.XY.offset(11)):
        Polygon((26, 5.5), (19, 5.5), (19, -1.5), (-3.7, -1.5), (-3.7, 9.8), (26, 9.8), align=None)
        with Locations((22.5, 1.5)):
            Rectangle(SKETCH_6_W, SKETCH_6_H)
    extrude(amount=-CUT_EXTRUDE_7_DEPTH, mode=Mode.SUBTRACT)

    # 草图7 → 切除-拉伸8 (cut, through all)
    with BuildSketch(Plane.ZY.offset(-19)):
        with Locations(Location((7.5, 1.5, 0), (0, 0, 303.557309762))):
            Circle(SKETCH_7_R)
    extrude(amount=-CUT_EXTRUDE_8_DEPTH, mode=Mode.SUBTRACT)

    # 草图10 outside → 切除-拉伸11 (cut, through all)
    with BuildSketch(Plane.XY.offset(11)):
        Rectangle(SKETCH_10_OUTSIDE_W, SKETCH_10_OUTSIDE_H)
        with Locations((-9.1, 3.7)):
            Rectangle(SKETCH_10_OUTSIDE_W_2, SKETCH_10_OUTSIDE_H_2, mode=Mode.SUBTRACT)
    extrude(amount=-CUT_EXTRUDE_11_DEPTH, mode=Mode.SUBTRACT)

    # 草图11 → 切除-拉伸12 (cut, through all)
    with BuildSketch(Plane(origin=(-3.7, 0, 0), x_dir=(0, 0, -1), z_dir=(1, 0, 0))):
        with Locations((-2, 3.7)):
            Rectangle(SKETCH_11_W, SKETCH_11_H)
    extrude(amount=-CUT_EXTRUDE_12_DEPTH, mode=Mode.SUBTRACT)

    # 草图13 → 凸台-拉伸8 (add)
    with BuildSketch(Plane(origin=(0, 0, 4), x_dir=(-1, 0, 0), z_dir=(0, 0, -1))):
        with Locations((9.1, 3)):
            Circle(SKETCH_13_R)
    extrude(amount=-EXTRUDE_8_DEPTH)

    # 草图14 → 切除-拉伸13 (cut)
    with BuildSketch(Plane(origin=(-3.7, 0, 0), x_dir=(0, 0, -1), z_dir=(1, 0, 0))):
        with Locations((-7.5, 1.3)):
            Circle(SKETCH_14_R)
    extrude(amount=-CUT_EXTRUDE_13_DEPTH, mode=Mode.SUBTRACT)


solid = part.part
